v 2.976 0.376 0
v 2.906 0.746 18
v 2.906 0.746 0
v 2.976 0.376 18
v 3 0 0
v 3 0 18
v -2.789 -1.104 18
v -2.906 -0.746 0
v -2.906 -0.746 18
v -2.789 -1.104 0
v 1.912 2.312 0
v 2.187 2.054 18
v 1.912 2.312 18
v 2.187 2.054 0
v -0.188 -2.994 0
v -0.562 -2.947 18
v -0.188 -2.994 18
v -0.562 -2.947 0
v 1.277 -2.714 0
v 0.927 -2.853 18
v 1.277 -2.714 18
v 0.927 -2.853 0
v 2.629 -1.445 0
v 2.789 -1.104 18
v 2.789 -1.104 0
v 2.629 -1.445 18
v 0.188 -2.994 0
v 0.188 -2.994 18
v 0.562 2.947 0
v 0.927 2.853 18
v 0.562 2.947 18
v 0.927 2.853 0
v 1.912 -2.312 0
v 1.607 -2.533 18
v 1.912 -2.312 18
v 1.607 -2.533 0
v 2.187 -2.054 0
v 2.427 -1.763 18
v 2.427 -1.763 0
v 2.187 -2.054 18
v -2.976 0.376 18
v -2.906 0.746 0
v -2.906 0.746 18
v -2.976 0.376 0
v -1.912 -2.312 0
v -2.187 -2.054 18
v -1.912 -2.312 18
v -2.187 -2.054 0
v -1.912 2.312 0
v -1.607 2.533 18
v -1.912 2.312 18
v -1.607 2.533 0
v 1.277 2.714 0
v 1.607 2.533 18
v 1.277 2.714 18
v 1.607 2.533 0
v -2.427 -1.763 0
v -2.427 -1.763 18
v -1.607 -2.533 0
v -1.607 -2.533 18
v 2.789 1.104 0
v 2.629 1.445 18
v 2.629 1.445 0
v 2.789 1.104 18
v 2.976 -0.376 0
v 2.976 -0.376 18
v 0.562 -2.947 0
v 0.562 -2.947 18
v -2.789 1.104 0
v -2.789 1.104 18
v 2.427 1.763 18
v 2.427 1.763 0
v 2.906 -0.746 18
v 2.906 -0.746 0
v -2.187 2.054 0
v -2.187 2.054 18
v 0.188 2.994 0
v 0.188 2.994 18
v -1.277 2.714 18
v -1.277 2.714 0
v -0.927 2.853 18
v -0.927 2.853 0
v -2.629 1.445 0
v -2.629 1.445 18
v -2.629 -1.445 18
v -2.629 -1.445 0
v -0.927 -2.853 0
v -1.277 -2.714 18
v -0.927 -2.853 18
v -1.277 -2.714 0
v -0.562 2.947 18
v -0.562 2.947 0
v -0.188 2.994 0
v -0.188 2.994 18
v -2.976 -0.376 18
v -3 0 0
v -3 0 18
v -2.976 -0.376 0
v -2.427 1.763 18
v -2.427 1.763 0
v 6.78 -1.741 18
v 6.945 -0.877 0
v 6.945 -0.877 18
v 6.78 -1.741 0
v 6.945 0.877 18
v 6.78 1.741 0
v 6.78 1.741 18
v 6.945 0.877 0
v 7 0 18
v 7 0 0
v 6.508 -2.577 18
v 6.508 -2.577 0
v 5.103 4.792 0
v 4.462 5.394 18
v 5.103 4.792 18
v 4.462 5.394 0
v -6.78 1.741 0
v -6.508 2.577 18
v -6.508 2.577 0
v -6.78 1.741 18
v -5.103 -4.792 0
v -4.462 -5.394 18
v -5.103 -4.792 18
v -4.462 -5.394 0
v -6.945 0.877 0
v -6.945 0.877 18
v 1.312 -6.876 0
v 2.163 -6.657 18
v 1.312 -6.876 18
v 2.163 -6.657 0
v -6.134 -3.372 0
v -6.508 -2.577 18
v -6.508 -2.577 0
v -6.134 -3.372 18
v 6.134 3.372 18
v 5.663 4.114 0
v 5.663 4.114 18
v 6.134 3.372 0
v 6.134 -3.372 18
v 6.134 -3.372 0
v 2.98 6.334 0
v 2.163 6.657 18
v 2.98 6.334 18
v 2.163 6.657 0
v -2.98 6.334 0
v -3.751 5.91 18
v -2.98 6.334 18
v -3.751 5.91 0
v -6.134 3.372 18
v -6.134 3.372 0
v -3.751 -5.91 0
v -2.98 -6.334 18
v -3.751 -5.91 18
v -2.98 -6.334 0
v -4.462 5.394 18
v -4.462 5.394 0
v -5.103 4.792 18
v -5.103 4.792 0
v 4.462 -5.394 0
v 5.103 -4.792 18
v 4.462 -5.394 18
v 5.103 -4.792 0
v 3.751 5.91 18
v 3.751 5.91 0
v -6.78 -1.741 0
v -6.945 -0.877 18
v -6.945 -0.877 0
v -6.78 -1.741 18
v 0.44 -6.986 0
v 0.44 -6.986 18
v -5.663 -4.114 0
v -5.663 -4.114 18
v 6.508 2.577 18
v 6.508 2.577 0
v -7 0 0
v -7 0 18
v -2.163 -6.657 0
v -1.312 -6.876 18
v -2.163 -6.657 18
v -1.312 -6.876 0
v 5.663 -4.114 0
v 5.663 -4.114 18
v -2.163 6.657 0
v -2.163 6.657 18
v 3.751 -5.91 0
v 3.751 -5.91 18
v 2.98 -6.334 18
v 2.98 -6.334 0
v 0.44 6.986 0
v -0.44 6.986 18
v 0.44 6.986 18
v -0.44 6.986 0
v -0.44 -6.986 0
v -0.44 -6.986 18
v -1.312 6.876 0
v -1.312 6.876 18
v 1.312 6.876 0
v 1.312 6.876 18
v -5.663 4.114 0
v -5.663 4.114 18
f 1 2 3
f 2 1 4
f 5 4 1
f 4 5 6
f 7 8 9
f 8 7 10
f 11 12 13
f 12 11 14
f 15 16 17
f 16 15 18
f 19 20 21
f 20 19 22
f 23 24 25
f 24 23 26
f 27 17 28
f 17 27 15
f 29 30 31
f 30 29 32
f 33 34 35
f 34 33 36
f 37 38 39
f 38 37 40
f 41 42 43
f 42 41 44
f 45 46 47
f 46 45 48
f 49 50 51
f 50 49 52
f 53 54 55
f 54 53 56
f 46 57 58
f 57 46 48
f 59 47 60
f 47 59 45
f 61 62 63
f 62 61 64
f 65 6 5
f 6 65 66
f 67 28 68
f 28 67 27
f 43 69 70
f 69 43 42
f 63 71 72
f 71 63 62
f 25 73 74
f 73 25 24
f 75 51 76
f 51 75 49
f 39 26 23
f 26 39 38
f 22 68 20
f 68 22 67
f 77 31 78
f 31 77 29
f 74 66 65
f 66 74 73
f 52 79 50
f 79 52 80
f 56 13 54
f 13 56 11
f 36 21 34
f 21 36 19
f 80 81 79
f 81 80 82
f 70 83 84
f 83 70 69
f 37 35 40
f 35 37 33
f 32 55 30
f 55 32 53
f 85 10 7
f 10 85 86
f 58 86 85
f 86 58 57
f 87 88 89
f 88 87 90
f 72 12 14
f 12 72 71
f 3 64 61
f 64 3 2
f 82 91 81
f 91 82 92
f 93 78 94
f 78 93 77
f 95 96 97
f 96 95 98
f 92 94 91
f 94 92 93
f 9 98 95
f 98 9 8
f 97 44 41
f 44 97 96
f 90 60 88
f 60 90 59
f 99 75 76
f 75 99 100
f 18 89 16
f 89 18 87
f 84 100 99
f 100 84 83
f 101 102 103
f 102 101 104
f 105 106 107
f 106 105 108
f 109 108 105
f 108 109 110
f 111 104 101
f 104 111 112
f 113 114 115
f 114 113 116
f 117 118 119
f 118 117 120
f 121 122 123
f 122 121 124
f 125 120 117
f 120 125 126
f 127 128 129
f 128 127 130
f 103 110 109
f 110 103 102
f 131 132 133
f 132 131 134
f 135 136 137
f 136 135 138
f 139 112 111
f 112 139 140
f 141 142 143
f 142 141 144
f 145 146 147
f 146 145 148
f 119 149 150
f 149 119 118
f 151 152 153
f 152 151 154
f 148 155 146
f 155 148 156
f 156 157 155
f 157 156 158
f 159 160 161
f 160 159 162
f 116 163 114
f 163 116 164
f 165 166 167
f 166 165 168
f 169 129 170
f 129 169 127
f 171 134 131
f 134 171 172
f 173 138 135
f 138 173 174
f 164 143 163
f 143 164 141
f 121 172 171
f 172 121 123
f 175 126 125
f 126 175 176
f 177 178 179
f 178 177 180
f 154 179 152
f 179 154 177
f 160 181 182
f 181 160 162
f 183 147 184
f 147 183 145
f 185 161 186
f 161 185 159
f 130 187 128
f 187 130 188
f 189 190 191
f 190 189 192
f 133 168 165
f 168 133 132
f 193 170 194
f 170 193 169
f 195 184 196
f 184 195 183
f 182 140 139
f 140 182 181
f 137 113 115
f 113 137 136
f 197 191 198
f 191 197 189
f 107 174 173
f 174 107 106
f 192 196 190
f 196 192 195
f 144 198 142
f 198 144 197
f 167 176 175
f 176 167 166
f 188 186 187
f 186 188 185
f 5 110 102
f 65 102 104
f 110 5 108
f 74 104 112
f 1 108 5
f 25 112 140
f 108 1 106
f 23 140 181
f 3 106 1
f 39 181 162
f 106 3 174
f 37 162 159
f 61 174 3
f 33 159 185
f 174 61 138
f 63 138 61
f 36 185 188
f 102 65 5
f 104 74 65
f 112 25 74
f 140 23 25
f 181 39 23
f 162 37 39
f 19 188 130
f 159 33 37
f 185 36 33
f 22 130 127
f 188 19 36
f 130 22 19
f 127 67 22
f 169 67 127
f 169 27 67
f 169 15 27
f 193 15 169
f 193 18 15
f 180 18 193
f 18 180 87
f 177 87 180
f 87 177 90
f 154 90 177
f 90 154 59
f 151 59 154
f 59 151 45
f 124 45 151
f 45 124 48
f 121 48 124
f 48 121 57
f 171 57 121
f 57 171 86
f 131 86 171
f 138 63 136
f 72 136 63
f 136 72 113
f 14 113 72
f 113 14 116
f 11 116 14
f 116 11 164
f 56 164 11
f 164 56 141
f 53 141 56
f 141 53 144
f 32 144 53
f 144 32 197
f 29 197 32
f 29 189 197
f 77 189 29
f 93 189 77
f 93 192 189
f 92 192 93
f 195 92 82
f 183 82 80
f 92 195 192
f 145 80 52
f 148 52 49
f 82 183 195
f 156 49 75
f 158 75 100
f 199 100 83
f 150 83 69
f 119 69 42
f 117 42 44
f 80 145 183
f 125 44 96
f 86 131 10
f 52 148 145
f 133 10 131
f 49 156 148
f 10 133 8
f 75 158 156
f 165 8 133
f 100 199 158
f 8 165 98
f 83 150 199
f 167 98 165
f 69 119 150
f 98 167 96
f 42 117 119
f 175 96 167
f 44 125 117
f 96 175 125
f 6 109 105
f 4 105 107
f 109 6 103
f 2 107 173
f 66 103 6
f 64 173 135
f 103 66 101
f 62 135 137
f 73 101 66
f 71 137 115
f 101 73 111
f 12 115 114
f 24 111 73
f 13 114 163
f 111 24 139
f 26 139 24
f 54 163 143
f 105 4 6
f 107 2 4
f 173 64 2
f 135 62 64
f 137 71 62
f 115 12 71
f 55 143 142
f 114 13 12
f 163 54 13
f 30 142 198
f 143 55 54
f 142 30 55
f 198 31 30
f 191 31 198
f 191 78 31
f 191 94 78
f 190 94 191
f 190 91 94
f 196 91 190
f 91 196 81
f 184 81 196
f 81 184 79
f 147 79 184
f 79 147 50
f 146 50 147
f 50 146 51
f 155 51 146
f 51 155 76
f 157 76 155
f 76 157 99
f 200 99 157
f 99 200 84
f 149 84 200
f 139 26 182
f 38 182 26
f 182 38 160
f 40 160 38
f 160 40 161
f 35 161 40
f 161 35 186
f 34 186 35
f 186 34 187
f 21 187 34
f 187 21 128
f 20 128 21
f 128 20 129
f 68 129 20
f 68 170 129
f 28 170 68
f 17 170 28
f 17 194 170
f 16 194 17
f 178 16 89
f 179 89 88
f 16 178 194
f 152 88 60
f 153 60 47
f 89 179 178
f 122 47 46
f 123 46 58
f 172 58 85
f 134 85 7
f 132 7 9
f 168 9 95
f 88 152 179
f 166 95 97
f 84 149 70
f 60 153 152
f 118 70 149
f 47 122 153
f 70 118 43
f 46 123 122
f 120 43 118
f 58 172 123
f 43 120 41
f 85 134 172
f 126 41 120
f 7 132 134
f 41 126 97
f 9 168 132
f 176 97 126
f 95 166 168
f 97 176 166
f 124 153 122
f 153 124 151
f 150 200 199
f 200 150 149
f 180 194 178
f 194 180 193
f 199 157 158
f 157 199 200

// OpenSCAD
$fn = 50;

difference() {
	union() {
		cylinder(h = 18, r = 7.0);
	}
	union() {
		translate(v = [0, 0, -100]) {
			cylinder(h = 200, r = 3.0);
		}
		translate(v = [0, 0, -100]) {
			cylinder(h = 200, r = 1.5);
		}
	}
}
